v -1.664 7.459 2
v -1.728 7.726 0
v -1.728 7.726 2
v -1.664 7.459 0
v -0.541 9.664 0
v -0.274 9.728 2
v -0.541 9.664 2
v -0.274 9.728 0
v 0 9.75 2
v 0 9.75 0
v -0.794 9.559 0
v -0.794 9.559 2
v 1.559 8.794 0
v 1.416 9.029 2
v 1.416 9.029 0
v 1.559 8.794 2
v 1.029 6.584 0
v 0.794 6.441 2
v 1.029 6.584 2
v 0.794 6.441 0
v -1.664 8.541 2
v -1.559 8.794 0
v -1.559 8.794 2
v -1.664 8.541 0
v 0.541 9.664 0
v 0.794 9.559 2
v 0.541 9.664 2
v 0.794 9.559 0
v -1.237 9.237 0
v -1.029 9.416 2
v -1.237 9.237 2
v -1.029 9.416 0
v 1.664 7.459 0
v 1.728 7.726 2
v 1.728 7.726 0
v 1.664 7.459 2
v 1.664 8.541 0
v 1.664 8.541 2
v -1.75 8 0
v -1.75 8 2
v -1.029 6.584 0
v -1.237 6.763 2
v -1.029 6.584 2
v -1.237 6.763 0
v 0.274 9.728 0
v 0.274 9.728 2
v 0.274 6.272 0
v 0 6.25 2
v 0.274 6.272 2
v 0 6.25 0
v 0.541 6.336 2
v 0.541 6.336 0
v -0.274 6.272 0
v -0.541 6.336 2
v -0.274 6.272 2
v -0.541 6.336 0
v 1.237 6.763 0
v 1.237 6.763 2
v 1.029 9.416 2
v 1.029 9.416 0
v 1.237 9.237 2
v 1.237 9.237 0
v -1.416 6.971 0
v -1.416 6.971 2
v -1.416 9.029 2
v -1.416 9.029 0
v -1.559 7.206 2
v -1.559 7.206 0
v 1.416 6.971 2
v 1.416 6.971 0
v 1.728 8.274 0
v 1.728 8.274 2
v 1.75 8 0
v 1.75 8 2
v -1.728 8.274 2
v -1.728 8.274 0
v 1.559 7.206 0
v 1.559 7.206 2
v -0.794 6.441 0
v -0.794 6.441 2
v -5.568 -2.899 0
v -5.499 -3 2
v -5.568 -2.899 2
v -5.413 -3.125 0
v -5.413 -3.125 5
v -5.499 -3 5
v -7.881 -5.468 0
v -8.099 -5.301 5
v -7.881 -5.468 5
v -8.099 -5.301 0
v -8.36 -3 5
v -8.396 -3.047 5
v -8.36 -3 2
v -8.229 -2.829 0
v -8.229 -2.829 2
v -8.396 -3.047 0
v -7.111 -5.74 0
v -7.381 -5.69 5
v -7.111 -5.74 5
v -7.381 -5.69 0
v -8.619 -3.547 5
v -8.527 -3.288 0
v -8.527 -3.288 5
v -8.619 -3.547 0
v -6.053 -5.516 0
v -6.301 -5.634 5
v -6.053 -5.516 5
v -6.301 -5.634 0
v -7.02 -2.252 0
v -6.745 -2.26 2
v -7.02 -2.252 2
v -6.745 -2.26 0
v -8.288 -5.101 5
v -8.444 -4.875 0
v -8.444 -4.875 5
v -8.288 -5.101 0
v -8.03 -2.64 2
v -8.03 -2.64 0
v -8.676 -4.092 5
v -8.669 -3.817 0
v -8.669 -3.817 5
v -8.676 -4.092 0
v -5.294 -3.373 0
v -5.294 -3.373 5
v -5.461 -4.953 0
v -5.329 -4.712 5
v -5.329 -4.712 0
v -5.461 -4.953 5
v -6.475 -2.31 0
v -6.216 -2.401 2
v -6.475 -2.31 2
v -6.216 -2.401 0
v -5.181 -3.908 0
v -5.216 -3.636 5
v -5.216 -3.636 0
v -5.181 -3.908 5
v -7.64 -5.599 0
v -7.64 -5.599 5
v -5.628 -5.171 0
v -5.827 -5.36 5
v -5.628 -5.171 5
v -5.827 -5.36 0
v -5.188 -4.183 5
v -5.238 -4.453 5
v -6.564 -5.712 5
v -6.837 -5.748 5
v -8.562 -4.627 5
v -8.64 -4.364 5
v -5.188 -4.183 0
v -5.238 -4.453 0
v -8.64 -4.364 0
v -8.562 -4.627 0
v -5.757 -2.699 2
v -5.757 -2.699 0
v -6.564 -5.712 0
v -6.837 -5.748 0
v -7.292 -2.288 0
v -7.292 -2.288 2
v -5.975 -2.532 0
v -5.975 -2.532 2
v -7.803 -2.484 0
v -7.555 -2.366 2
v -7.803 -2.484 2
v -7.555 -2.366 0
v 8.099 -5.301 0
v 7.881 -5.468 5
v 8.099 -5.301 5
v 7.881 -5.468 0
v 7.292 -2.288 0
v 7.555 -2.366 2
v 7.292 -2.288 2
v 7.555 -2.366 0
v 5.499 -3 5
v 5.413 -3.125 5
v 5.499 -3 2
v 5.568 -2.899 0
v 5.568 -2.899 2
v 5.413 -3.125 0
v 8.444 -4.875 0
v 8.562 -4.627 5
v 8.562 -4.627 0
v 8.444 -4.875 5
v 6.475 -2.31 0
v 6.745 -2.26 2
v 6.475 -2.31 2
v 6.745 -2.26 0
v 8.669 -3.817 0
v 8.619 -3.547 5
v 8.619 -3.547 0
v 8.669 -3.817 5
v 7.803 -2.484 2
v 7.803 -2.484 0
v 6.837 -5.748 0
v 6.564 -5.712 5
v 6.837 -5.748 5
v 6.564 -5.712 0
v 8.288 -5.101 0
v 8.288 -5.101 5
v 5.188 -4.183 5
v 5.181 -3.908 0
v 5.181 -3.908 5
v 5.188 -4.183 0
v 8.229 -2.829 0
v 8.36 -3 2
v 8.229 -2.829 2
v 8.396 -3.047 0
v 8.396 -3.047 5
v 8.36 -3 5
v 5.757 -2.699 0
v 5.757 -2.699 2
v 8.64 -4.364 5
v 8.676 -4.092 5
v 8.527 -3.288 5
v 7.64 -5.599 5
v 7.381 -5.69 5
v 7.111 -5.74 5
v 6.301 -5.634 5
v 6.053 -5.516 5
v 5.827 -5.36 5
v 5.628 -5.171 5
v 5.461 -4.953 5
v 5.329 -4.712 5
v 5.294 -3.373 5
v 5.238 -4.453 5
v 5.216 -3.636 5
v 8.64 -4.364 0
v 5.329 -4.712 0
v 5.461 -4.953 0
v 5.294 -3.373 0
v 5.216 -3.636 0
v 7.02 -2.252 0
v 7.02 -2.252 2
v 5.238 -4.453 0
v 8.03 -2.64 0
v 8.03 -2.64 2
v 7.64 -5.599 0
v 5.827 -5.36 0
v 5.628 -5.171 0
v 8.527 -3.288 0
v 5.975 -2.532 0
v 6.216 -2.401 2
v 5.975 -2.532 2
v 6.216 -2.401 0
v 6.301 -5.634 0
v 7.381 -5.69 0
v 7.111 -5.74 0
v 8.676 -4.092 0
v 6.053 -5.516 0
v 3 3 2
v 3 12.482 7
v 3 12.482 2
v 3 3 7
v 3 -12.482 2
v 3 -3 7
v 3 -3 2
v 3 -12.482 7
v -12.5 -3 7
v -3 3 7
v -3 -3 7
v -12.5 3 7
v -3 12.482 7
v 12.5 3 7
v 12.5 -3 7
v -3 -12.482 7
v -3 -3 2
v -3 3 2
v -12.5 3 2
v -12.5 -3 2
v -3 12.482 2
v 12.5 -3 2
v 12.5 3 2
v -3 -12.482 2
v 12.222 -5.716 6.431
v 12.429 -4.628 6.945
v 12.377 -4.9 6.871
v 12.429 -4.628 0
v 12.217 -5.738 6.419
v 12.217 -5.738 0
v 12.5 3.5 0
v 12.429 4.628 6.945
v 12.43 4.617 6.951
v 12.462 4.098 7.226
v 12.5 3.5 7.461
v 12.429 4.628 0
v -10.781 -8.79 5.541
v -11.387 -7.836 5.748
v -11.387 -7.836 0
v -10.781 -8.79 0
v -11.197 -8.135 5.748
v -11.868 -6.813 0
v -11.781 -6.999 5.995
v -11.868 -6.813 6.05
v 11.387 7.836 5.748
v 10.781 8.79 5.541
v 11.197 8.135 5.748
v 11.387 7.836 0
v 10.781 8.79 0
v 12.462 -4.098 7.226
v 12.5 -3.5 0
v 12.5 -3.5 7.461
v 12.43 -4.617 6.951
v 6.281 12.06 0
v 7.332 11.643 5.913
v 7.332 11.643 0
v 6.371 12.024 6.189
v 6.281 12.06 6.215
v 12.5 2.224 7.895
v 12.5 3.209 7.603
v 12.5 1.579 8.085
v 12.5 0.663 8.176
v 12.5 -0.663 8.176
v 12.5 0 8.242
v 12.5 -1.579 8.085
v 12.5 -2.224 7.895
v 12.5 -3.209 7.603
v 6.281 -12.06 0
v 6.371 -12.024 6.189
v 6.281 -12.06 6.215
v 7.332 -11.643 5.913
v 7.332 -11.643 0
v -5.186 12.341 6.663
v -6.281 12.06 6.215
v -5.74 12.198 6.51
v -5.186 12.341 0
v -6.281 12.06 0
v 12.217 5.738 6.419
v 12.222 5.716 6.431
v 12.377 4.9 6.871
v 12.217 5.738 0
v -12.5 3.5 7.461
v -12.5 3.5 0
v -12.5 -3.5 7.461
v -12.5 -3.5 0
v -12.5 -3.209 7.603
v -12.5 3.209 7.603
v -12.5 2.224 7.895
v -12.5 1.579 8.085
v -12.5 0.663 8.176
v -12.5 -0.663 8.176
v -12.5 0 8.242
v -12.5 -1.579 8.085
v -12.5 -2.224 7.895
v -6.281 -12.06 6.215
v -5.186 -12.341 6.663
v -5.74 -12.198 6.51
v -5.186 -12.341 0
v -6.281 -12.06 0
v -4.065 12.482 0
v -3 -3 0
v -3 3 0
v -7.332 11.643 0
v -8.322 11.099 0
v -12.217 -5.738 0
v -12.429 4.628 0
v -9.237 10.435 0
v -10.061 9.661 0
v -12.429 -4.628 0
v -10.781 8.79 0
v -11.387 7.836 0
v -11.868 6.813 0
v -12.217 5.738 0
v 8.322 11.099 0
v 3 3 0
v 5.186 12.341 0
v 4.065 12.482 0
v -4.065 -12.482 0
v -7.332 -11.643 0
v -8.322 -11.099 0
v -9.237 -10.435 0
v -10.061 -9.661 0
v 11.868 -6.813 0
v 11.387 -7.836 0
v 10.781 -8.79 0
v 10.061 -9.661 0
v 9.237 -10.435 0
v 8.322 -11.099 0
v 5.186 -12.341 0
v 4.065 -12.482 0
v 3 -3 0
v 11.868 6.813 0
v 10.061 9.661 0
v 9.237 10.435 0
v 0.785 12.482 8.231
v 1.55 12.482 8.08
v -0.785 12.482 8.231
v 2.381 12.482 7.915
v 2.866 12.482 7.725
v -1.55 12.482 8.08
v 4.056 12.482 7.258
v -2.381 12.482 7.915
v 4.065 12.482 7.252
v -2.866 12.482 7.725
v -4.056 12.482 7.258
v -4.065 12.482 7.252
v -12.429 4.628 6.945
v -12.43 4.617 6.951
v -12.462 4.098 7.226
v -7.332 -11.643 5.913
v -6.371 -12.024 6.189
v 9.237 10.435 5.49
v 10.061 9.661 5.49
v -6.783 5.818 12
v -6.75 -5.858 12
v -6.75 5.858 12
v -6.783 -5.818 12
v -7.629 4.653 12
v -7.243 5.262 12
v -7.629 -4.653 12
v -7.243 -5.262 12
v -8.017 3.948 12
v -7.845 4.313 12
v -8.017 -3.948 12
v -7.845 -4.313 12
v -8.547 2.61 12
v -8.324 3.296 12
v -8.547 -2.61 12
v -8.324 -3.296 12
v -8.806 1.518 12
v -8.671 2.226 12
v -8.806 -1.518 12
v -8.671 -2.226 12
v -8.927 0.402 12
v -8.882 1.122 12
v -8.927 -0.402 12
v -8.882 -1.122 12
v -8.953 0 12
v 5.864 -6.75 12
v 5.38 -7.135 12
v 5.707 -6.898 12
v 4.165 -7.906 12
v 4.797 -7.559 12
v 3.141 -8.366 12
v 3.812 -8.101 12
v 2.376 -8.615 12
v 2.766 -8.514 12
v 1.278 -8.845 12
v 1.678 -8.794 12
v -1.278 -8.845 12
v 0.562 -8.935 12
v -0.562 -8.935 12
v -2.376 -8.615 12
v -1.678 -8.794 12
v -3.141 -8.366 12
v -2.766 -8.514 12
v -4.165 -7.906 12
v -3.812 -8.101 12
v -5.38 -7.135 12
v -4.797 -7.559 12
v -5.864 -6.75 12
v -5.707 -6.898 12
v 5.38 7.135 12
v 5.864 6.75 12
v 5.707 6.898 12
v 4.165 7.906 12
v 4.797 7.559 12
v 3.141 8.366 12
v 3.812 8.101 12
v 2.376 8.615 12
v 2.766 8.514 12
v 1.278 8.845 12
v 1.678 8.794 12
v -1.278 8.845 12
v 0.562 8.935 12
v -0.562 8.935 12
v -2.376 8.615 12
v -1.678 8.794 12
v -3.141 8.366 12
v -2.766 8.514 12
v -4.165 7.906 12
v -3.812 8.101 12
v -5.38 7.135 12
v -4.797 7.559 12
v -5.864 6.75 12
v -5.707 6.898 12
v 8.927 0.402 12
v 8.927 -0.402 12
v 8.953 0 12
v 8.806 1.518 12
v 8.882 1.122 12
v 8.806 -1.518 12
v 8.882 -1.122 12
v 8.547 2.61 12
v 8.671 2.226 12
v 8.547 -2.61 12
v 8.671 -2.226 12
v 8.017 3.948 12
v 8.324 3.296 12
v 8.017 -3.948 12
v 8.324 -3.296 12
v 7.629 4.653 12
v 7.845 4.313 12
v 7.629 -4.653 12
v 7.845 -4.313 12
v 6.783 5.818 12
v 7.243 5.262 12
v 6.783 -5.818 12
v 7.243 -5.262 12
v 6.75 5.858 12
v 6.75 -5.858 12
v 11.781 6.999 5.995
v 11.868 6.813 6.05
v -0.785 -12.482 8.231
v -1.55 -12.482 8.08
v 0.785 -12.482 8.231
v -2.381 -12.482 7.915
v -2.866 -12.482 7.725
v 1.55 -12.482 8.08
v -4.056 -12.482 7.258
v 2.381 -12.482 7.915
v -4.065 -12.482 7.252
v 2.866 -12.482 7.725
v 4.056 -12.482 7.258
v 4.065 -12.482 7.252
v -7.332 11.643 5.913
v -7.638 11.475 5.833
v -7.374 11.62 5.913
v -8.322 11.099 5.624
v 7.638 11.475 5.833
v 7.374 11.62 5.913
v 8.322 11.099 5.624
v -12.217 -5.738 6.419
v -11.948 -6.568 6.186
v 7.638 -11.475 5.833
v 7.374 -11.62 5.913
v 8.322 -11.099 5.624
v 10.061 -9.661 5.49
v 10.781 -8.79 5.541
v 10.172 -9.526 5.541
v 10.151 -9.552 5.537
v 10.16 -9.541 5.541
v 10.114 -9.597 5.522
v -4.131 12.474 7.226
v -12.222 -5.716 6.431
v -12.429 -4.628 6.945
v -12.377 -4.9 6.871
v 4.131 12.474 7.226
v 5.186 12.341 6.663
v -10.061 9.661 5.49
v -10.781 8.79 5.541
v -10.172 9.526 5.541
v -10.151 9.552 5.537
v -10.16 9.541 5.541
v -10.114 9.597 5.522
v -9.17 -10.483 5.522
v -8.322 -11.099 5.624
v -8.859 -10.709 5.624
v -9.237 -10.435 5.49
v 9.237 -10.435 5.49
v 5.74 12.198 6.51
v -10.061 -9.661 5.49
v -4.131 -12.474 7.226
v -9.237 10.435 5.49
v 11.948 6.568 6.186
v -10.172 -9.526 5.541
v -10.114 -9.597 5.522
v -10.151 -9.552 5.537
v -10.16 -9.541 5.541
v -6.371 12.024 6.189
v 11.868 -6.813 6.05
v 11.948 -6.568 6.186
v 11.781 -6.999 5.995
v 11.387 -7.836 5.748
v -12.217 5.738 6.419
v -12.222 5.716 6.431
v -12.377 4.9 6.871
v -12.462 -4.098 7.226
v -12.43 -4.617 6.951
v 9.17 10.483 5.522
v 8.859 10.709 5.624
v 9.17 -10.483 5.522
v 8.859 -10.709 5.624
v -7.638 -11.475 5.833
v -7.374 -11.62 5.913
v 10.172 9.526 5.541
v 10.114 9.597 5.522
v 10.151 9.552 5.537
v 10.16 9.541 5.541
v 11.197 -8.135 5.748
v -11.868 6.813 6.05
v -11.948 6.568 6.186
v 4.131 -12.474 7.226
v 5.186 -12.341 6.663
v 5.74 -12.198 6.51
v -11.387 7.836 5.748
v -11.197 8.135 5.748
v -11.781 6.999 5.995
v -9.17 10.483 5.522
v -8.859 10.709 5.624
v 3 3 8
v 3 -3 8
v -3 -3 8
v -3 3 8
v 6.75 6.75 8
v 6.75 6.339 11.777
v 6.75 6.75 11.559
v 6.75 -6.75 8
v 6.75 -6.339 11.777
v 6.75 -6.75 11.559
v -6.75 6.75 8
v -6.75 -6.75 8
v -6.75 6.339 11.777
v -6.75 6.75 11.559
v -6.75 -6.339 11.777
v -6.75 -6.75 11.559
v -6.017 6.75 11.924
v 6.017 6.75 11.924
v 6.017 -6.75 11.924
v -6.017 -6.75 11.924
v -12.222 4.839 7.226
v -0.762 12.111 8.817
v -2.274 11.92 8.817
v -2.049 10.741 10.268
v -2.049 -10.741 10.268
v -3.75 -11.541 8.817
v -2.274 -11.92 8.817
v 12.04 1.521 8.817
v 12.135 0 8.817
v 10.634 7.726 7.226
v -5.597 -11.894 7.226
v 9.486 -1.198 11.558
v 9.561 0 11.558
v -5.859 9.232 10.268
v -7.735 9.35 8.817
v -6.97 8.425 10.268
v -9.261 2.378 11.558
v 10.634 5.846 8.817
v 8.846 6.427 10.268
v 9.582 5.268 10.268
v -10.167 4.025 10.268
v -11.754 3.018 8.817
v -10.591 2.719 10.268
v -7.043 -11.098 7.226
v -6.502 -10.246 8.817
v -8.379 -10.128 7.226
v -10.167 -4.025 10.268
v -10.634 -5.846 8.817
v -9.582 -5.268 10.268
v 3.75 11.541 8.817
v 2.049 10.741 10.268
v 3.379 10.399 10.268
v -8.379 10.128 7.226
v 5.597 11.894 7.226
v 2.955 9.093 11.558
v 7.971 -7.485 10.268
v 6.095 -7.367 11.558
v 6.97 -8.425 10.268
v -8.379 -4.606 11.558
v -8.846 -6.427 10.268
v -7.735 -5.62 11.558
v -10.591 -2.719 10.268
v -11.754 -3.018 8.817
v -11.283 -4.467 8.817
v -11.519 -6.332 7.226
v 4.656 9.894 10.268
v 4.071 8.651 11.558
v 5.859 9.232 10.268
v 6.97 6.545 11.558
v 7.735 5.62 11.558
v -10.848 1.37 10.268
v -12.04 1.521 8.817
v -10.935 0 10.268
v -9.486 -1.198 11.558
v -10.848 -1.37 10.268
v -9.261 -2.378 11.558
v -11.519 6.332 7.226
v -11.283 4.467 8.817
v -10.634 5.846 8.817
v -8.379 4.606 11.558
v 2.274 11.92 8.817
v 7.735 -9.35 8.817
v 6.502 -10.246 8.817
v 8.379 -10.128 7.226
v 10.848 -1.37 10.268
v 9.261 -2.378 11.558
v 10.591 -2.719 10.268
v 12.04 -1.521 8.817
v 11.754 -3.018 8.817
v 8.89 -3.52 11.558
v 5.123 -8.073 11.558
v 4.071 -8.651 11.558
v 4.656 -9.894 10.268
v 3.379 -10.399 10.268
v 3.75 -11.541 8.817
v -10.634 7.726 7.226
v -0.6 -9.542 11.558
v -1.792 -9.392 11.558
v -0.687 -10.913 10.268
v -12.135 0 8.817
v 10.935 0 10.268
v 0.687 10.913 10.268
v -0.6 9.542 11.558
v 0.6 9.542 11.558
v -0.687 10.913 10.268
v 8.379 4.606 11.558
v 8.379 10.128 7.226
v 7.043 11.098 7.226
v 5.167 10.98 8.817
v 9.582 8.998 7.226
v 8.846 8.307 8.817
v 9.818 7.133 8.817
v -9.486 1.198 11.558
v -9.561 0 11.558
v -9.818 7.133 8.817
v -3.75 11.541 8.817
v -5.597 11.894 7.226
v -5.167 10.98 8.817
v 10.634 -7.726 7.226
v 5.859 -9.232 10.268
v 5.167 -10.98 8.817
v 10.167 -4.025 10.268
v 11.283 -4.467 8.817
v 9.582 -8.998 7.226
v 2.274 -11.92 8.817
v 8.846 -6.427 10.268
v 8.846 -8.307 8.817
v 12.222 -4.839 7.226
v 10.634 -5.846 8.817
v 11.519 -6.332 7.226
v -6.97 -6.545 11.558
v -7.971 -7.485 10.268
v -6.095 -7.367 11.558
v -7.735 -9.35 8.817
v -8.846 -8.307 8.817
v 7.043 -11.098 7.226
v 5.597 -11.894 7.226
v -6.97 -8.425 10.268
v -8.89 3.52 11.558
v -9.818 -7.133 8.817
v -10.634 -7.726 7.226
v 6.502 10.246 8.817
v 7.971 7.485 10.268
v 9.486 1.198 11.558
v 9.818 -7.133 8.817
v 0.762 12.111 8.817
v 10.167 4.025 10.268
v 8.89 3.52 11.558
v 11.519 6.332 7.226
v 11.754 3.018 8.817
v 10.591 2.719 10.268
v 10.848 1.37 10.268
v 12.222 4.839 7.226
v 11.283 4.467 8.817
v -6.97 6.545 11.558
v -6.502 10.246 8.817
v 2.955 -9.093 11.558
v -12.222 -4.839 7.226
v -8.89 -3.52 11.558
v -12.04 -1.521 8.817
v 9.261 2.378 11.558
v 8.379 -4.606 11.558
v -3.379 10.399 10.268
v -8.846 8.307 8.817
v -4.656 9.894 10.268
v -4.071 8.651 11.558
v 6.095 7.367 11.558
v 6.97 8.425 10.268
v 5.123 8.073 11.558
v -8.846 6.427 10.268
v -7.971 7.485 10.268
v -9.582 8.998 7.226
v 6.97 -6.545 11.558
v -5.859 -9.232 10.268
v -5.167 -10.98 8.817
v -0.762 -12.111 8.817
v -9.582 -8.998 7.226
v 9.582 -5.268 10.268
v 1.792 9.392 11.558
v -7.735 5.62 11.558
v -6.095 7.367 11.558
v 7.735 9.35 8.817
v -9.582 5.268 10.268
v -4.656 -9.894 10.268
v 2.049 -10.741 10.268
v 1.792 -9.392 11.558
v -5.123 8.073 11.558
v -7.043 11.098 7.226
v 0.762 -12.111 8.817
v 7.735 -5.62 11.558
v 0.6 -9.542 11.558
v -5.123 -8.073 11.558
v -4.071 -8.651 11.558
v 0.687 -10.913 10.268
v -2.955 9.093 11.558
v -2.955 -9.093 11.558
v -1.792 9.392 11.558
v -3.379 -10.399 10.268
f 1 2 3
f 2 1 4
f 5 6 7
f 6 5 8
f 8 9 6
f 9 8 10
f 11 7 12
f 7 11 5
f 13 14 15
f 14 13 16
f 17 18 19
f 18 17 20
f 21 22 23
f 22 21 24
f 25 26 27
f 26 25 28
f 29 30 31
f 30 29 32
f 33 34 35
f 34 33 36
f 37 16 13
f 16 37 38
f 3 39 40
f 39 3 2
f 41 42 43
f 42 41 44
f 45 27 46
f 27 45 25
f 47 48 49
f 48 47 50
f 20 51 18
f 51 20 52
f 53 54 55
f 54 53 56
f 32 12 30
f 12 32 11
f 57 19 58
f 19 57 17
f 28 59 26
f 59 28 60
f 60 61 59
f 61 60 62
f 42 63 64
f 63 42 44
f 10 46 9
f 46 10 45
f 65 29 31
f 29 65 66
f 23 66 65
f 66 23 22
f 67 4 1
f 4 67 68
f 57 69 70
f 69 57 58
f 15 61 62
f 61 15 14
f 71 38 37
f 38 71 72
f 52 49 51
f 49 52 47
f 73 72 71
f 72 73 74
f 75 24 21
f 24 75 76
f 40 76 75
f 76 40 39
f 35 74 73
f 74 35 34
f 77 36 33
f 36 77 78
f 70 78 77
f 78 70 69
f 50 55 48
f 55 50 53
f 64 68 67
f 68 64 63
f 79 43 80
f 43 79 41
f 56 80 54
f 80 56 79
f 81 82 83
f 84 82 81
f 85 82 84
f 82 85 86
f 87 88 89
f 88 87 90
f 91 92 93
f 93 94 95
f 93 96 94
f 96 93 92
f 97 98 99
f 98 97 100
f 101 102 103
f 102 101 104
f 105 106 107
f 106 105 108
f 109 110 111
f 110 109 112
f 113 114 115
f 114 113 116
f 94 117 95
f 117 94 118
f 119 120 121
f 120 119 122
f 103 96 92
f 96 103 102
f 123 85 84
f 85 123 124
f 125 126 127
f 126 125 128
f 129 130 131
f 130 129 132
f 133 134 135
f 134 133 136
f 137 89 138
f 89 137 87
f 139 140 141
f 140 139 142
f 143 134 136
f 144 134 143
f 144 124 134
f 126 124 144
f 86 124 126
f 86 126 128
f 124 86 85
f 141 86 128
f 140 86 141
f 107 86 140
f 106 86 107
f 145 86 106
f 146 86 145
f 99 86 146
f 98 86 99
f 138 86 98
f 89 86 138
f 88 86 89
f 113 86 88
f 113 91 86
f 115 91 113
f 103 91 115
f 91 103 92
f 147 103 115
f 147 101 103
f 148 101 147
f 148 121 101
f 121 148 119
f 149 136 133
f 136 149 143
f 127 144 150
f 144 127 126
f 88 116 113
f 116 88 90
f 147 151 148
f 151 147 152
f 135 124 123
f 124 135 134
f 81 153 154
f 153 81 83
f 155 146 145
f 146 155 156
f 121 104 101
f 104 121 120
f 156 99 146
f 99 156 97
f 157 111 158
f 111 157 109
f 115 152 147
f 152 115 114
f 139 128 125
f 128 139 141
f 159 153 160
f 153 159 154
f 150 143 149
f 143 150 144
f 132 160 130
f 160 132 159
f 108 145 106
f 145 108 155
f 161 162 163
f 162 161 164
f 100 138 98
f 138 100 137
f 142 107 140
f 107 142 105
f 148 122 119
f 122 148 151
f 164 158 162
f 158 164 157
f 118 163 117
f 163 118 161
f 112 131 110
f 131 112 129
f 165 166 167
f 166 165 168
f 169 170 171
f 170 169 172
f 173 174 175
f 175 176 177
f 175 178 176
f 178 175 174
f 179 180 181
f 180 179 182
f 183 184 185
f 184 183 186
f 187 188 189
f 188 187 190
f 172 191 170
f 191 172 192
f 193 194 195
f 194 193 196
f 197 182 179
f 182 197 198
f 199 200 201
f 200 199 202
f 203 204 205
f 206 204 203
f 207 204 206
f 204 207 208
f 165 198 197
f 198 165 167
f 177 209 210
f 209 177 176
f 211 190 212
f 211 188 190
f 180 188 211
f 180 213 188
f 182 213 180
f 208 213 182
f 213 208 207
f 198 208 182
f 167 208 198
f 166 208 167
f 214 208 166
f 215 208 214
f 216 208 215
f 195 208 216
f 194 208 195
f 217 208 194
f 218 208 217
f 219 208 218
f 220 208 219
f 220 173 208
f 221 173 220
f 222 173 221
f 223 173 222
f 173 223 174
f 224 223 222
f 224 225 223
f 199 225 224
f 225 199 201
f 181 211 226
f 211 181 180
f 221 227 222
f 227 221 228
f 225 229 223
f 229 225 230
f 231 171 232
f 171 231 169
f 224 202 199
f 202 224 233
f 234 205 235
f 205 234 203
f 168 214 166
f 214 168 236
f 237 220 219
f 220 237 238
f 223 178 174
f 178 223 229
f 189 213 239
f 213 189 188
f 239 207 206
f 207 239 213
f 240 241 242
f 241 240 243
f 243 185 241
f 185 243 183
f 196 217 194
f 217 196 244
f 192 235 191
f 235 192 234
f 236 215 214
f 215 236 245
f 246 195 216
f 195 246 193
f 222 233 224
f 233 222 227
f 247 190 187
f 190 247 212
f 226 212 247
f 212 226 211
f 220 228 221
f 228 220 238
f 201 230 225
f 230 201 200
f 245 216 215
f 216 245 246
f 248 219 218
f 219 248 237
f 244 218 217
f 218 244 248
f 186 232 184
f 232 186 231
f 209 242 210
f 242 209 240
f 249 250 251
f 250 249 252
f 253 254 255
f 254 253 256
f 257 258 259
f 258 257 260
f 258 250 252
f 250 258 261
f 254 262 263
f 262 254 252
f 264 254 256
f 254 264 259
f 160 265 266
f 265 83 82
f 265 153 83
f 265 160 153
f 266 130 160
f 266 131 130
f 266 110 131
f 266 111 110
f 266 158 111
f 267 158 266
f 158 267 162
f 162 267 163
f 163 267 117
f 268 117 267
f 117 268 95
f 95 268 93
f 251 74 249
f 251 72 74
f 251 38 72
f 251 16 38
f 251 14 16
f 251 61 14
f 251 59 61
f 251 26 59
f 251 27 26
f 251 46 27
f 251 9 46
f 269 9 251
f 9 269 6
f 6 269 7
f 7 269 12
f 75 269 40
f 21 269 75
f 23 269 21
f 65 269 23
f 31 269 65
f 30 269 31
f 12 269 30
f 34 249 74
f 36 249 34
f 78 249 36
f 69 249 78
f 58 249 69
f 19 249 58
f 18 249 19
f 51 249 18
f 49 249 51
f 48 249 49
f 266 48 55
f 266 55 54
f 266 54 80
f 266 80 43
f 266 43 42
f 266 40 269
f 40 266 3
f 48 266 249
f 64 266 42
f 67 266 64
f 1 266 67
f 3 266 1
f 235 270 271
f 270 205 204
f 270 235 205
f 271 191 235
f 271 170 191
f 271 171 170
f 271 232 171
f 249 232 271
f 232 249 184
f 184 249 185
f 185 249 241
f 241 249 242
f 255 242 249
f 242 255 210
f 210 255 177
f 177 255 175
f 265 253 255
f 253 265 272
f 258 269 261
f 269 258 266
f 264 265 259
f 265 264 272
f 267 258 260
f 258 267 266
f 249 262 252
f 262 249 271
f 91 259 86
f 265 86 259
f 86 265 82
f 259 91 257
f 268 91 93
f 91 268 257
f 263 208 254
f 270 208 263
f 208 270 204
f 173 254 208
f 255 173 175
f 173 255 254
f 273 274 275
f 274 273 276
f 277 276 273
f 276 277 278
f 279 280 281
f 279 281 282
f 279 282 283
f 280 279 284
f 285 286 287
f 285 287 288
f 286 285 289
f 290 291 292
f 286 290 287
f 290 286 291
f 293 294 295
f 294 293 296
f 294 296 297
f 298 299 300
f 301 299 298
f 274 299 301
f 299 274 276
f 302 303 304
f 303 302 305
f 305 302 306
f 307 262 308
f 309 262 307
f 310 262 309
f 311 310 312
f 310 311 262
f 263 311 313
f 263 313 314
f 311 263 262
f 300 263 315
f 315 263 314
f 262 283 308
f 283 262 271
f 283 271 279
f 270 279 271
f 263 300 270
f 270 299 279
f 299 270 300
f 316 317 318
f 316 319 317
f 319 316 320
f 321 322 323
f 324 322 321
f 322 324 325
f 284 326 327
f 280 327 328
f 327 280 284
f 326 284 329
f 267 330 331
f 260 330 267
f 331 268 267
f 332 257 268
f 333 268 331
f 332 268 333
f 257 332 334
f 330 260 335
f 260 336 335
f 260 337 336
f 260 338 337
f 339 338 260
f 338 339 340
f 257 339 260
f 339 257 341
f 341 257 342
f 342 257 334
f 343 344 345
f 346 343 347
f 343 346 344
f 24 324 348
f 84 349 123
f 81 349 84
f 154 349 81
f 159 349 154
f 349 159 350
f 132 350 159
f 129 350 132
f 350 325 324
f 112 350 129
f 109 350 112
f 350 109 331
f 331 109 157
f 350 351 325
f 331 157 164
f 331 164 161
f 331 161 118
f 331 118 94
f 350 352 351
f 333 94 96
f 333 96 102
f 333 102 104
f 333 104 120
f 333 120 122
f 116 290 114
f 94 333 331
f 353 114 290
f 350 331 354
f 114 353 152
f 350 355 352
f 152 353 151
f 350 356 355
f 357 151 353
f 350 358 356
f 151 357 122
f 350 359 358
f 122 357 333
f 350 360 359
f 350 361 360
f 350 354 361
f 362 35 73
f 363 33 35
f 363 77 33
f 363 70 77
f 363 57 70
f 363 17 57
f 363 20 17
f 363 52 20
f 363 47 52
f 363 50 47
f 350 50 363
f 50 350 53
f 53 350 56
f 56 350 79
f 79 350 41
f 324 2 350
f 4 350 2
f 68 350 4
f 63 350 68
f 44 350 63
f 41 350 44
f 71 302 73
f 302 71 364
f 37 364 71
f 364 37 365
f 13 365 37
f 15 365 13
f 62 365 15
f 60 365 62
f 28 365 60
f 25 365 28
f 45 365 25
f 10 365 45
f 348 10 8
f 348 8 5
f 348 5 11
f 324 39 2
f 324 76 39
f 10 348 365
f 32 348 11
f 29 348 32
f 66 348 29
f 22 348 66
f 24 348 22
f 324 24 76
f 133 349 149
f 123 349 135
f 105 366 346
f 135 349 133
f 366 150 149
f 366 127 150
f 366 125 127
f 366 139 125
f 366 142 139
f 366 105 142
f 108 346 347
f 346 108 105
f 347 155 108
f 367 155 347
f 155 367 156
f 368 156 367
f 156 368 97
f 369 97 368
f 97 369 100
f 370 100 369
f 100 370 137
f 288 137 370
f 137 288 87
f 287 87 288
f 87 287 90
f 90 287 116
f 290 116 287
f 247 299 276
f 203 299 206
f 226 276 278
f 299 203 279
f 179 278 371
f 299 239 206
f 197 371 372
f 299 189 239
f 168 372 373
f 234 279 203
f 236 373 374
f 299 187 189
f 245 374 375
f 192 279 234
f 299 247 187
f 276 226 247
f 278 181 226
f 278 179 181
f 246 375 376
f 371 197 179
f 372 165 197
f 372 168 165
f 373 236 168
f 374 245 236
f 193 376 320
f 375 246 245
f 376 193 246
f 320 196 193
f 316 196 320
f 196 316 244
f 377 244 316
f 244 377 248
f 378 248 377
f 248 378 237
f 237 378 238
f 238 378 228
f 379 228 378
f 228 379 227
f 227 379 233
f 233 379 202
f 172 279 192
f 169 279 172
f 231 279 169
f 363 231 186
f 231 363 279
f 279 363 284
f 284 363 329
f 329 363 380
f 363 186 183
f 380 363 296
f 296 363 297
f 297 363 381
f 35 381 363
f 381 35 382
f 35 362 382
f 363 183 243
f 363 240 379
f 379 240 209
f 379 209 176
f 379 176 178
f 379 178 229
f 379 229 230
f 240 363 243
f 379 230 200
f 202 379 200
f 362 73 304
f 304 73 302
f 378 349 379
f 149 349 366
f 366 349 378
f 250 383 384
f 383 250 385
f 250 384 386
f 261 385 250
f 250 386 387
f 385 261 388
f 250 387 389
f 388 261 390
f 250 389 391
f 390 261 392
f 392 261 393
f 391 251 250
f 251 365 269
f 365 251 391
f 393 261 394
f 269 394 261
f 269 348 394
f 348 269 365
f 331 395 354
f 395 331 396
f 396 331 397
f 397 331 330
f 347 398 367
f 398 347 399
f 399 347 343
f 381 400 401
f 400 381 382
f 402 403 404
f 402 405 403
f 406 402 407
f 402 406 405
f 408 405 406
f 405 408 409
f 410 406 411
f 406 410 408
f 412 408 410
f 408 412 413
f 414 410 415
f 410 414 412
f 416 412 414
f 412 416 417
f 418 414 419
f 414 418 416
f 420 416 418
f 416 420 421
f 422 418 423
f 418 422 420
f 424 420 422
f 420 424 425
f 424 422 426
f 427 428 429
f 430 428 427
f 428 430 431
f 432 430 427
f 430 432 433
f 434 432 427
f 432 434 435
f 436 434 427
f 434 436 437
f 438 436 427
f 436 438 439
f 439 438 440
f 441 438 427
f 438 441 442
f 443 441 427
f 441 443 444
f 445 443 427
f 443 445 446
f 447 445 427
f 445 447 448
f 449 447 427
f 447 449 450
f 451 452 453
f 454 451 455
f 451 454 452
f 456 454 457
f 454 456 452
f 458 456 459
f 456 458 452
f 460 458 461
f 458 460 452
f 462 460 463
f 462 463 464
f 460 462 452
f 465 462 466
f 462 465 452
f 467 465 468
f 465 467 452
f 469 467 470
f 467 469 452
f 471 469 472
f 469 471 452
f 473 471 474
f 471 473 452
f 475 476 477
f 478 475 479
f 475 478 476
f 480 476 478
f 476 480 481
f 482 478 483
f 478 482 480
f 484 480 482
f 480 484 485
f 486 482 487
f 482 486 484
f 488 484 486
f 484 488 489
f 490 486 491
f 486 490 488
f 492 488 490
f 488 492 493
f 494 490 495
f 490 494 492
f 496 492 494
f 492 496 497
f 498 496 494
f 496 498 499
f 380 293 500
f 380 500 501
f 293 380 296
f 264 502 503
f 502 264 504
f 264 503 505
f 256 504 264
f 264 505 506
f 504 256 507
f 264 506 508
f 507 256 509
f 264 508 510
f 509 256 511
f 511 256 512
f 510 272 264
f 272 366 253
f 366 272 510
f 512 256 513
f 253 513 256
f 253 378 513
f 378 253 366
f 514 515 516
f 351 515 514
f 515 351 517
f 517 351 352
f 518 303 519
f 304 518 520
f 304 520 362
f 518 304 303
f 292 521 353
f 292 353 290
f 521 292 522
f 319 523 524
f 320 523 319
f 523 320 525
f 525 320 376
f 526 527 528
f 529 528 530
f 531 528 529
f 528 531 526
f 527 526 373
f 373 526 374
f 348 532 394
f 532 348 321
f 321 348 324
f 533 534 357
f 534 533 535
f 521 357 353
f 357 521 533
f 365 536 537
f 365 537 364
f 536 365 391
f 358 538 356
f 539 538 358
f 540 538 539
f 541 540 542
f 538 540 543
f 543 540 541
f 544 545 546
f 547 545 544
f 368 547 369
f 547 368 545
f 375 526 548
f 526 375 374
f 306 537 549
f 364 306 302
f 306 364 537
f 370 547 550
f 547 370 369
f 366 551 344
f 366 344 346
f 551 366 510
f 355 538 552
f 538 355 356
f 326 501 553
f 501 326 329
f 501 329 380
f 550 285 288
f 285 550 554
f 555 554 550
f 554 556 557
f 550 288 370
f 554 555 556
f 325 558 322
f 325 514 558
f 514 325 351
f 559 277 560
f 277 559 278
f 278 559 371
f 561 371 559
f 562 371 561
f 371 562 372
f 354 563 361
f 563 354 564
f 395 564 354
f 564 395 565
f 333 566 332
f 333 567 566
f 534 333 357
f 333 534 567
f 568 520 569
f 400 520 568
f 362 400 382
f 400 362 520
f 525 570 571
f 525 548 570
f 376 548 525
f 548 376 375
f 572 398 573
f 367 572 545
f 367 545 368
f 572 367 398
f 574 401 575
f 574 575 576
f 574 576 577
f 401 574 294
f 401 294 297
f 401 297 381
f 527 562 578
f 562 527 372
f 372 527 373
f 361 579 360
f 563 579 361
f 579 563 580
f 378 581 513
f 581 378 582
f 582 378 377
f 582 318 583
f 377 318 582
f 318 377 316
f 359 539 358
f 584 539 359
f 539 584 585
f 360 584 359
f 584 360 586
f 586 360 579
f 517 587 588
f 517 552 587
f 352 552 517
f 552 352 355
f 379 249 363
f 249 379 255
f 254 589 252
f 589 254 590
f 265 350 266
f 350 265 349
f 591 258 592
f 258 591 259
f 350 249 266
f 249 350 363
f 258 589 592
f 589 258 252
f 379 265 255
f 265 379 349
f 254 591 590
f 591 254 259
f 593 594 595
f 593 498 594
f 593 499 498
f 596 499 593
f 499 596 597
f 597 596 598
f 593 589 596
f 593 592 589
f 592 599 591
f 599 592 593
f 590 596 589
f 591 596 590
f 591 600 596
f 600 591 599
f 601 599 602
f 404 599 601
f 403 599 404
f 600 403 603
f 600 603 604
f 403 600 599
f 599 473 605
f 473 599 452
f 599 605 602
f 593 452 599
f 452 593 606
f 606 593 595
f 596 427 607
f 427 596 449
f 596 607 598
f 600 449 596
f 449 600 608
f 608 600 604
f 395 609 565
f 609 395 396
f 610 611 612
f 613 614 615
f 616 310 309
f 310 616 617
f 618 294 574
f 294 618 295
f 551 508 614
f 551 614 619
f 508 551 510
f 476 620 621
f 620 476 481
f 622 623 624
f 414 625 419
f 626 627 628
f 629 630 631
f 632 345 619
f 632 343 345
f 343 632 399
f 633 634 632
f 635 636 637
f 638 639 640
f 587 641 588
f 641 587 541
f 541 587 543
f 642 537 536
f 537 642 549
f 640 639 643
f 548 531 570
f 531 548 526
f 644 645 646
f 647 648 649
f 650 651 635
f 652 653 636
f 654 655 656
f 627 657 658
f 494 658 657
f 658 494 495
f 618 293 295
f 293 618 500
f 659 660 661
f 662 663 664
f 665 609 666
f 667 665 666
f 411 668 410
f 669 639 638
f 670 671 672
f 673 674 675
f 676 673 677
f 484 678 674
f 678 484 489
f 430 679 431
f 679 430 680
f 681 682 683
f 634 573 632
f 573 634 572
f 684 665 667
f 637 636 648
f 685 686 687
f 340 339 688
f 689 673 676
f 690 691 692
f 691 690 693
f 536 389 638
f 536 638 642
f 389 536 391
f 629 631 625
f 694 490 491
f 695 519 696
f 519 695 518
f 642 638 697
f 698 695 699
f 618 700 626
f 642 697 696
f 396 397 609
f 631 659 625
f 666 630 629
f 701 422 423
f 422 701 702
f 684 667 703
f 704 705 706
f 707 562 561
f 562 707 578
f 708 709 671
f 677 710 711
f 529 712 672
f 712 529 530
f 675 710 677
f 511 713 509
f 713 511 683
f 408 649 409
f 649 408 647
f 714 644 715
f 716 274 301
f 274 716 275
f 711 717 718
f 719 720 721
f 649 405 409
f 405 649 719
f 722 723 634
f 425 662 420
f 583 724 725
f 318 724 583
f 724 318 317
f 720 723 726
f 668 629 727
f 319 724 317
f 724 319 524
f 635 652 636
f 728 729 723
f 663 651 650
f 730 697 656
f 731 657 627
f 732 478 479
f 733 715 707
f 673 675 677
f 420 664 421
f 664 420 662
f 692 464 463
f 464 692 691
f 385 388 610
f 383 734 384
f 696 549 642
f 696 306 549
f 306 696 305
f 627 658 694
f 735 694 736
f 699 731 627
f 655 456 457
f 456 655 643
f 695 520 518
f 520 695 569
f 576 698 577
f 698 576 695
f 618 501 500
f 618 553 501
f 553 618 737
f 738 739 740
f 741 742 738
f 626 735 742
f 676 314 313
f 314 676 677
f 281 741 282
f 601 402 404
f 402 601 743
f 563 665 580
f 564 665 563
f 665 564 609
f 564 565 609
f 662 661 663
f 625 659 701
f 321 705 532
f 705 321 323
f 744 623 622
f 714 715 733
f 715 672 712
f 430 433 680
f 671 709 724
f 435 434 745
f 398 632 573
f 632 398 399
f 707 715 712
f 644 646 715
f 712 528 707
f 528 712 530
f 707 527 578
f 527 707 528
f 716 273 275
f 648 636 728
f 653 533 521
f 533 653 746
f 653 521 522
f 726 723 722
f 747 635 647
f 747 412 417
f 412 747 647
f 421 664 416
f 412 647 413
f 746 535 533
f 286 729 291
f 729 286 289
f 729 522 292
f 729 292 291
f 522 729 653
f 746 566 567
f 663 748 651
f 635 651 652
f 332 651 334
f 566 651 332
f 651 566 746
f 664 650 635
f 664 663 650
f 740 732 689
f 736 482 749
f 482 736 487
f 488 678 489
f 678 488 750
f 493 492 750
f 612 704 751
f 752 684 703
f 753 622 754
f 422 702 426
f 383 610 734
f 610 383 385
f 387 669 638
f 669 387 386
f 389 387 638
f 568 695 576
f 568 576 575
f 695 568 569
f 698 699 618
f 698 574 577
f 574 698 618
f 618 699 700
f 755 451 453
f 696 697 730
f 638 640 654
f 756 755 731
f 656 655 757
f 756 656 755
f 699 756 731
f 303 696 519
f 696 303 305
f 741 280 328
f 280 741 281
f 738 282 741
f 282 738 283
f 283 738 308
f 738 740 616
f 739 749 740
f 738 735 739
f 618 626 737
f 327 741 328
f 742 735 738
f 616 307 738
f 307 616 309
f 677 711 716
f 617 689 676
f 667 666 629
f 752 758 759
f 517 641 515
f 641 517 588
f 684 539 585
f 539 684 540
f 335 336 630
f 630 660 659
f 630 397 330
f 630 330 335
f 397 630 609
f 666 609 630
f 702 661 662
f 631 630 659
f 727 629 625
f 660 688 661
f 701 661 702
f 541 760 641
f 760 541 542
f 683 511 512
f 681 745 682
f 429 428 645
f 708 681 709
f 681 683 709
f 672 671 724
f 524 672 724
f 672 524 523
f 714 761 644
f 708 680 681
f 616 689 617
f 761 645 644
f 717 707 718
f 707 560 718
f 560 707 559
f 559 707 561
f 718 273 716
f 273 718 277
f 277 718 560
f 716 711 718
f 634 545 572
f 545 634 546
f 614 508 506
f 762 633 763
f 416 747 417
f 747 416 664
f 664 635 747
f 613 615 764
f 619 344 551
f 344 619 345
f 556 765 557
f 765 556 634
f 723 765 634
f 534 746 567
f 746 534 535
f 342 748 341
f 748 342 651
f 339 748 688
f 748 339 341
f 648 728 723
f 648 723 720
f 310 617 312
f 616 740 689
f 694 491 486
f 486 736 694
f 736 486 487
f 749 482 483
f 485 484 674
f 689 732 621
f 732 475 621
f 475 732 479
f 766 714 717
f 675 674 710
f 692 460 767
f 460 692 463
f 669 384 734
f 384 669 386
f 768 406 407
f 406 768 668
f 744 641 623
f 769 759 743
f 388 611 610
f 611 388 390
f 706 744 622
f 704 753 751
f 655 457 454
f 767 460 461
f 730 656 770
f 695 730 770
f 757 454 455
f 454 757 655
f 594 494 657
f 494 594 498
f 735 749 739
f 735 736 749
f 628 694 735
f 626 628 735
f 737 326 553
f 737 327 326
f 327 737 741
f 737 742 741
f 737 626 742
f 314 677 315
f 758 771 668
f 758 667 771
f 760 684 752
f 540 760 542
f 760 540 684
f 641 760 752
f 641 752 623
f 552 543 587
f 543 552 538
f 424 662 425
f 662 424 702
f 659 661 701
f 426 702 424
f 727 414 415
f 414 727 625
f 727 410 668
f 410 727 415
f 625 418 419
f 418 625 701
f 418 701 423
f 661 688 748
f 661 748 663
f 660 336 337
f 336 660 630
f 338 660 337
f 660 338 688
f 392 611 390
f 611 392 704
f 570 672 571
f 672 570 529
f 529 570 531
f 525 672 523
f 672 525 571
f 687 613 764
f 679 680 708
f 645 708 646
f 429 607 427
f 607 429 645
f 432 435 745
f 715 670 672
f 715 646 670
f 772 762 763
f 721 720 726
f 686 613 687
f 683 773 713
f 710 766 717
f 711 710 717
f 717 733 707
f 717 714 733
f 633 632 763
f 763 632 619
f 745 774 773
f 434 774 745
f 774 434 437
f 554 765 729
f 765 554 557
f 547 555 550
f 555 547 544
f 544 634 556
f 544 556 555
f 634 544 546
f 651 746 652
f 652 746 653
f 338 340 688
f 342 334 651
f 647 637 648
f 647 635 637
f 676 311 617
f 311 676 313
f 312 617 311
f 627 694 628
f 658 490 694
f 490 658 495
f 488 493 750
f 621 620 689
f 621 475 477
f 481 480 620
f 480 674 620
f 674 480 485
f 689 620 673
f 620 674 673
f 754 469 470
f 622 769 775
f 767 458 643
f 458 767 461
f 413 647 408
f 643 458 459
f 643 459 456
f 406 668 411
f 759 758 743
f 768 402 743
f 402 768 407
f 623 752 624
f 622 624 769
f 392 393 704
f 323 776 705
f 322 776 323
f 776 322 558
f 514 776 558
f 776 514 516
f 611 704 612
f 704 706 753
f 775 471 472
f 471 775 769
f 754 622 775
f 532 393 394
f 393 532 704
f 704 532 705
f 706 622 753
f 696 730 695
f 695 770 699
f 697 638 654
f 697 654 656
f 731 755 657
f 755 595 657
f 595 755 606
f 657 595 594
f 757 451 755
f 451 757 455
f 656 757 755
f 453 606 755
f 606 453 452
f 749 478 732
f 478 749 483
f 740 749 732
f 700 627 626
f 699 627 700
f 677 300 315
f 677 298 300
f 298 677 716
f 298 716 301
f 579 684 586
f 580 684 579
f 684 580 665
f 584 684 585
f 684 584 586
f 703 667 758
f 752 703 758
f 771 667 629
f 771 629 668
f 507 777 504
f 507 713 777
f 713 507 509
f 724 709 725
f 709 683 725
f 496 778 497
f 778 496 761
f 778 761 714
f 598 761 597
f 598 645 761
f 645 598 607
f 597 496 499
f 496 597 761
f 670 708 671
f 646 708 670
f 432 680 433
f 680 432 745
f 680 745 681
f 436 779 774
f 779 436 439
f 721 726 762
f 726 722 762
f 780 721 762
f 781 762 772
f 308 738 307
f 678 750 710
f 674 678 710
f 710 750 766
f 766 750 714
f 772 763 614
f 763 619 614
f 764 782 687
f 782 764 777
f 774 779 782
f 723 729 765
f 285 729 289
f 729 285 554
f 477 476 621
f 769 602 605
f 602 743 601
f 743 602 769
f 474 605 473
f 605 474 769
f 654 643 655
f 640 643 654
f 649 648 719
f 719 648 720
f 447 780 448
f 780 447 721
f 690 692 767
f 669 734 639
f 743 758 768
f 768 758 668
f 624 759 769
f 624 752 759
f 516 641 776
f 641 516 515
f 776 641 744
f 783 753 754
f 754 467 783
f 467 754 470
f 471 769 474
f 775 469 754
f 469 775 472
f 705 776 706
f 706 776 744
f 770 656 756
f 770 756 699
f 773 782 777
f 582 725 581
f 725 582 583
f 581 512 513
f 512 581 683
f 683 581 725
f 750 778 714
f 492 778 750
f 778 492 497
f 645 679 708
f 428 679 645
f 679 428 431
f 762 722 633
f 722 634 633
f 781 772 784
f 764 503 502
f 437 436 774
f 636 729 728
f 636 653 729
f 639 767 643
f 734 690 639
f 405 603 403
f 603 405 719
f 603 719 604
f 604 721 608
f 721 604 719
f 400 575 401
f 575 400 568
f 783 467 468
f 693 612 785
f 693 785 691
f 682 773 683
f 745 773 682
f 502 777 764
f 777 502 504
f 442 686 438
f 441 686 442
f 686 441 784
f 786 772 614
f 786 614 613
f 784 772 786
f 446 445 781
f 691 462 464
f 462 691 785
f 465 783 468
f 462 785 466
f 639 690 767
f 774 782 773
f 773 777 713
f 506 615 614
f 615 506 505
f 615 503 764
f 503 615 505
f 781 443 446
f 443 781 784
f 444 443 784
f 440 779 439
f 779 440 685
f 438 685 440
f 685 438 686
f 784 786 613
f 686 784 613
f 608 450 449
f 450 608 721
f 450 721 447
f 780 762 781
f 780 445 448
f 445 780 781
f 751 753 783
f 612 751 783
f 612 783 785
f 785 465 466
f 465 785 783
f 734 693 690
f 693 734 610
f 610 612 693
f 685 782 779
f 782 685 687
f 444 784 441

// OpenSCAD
// This file is part of GNBot (https://github.com/carlosgs/GNBot)
// by Carlosgs (http://carlosgs.es)
// CC-BY-SA license (http://creativecommons.org/licenses/by-sa/3.0/)

drill_resolution = 40;
drill_diameter = 3.5;

LDR_width = 6;
LDR_height = 5;

piece_height = 12;

intersection() {
    difference() {

        //cylinder(r=25/2,h=piece_height,$fn=50);
        translate([0,0,piece_height/2])
          roundedRect2D([25,25,piece_height], 9);

        //cylinder(r=8/2,h=200,center=true,$fn=drill_resolution);
        cube([LDR_width,LDR_width,100],center=true);

        for (i = [0:2])
          rotate([0,0,i*360/3+90]) translate([8,0,0])
	        cylinder(r=drill_diameter/2,h=10,center=true,$fn=drill_resolution);

        translate([0,0,piece_height])
          cube([13.5,13.5,4*2],center=true);

        translate([0,0,2+LDR_height/2]) {
            cube([LDR_width,100,LDR_height],center=true);
            cube([100,LDR_width,LDR_height],center=true);
        }


    }

    sphere(r=15,$fn=50);

}//intersection


// http://www.thingiverse.com/thing:9347
module roundedRect2D(size, radius)
{
    $fn=50;
    x = size[0]-radius*2;
    y = size[1]-radius*2;
    z = size[2];

    minkowski()
    {
        cube(size=[x,y,z],center=true);
        cylinder(r=radius,h=0.00001);
    }
}
